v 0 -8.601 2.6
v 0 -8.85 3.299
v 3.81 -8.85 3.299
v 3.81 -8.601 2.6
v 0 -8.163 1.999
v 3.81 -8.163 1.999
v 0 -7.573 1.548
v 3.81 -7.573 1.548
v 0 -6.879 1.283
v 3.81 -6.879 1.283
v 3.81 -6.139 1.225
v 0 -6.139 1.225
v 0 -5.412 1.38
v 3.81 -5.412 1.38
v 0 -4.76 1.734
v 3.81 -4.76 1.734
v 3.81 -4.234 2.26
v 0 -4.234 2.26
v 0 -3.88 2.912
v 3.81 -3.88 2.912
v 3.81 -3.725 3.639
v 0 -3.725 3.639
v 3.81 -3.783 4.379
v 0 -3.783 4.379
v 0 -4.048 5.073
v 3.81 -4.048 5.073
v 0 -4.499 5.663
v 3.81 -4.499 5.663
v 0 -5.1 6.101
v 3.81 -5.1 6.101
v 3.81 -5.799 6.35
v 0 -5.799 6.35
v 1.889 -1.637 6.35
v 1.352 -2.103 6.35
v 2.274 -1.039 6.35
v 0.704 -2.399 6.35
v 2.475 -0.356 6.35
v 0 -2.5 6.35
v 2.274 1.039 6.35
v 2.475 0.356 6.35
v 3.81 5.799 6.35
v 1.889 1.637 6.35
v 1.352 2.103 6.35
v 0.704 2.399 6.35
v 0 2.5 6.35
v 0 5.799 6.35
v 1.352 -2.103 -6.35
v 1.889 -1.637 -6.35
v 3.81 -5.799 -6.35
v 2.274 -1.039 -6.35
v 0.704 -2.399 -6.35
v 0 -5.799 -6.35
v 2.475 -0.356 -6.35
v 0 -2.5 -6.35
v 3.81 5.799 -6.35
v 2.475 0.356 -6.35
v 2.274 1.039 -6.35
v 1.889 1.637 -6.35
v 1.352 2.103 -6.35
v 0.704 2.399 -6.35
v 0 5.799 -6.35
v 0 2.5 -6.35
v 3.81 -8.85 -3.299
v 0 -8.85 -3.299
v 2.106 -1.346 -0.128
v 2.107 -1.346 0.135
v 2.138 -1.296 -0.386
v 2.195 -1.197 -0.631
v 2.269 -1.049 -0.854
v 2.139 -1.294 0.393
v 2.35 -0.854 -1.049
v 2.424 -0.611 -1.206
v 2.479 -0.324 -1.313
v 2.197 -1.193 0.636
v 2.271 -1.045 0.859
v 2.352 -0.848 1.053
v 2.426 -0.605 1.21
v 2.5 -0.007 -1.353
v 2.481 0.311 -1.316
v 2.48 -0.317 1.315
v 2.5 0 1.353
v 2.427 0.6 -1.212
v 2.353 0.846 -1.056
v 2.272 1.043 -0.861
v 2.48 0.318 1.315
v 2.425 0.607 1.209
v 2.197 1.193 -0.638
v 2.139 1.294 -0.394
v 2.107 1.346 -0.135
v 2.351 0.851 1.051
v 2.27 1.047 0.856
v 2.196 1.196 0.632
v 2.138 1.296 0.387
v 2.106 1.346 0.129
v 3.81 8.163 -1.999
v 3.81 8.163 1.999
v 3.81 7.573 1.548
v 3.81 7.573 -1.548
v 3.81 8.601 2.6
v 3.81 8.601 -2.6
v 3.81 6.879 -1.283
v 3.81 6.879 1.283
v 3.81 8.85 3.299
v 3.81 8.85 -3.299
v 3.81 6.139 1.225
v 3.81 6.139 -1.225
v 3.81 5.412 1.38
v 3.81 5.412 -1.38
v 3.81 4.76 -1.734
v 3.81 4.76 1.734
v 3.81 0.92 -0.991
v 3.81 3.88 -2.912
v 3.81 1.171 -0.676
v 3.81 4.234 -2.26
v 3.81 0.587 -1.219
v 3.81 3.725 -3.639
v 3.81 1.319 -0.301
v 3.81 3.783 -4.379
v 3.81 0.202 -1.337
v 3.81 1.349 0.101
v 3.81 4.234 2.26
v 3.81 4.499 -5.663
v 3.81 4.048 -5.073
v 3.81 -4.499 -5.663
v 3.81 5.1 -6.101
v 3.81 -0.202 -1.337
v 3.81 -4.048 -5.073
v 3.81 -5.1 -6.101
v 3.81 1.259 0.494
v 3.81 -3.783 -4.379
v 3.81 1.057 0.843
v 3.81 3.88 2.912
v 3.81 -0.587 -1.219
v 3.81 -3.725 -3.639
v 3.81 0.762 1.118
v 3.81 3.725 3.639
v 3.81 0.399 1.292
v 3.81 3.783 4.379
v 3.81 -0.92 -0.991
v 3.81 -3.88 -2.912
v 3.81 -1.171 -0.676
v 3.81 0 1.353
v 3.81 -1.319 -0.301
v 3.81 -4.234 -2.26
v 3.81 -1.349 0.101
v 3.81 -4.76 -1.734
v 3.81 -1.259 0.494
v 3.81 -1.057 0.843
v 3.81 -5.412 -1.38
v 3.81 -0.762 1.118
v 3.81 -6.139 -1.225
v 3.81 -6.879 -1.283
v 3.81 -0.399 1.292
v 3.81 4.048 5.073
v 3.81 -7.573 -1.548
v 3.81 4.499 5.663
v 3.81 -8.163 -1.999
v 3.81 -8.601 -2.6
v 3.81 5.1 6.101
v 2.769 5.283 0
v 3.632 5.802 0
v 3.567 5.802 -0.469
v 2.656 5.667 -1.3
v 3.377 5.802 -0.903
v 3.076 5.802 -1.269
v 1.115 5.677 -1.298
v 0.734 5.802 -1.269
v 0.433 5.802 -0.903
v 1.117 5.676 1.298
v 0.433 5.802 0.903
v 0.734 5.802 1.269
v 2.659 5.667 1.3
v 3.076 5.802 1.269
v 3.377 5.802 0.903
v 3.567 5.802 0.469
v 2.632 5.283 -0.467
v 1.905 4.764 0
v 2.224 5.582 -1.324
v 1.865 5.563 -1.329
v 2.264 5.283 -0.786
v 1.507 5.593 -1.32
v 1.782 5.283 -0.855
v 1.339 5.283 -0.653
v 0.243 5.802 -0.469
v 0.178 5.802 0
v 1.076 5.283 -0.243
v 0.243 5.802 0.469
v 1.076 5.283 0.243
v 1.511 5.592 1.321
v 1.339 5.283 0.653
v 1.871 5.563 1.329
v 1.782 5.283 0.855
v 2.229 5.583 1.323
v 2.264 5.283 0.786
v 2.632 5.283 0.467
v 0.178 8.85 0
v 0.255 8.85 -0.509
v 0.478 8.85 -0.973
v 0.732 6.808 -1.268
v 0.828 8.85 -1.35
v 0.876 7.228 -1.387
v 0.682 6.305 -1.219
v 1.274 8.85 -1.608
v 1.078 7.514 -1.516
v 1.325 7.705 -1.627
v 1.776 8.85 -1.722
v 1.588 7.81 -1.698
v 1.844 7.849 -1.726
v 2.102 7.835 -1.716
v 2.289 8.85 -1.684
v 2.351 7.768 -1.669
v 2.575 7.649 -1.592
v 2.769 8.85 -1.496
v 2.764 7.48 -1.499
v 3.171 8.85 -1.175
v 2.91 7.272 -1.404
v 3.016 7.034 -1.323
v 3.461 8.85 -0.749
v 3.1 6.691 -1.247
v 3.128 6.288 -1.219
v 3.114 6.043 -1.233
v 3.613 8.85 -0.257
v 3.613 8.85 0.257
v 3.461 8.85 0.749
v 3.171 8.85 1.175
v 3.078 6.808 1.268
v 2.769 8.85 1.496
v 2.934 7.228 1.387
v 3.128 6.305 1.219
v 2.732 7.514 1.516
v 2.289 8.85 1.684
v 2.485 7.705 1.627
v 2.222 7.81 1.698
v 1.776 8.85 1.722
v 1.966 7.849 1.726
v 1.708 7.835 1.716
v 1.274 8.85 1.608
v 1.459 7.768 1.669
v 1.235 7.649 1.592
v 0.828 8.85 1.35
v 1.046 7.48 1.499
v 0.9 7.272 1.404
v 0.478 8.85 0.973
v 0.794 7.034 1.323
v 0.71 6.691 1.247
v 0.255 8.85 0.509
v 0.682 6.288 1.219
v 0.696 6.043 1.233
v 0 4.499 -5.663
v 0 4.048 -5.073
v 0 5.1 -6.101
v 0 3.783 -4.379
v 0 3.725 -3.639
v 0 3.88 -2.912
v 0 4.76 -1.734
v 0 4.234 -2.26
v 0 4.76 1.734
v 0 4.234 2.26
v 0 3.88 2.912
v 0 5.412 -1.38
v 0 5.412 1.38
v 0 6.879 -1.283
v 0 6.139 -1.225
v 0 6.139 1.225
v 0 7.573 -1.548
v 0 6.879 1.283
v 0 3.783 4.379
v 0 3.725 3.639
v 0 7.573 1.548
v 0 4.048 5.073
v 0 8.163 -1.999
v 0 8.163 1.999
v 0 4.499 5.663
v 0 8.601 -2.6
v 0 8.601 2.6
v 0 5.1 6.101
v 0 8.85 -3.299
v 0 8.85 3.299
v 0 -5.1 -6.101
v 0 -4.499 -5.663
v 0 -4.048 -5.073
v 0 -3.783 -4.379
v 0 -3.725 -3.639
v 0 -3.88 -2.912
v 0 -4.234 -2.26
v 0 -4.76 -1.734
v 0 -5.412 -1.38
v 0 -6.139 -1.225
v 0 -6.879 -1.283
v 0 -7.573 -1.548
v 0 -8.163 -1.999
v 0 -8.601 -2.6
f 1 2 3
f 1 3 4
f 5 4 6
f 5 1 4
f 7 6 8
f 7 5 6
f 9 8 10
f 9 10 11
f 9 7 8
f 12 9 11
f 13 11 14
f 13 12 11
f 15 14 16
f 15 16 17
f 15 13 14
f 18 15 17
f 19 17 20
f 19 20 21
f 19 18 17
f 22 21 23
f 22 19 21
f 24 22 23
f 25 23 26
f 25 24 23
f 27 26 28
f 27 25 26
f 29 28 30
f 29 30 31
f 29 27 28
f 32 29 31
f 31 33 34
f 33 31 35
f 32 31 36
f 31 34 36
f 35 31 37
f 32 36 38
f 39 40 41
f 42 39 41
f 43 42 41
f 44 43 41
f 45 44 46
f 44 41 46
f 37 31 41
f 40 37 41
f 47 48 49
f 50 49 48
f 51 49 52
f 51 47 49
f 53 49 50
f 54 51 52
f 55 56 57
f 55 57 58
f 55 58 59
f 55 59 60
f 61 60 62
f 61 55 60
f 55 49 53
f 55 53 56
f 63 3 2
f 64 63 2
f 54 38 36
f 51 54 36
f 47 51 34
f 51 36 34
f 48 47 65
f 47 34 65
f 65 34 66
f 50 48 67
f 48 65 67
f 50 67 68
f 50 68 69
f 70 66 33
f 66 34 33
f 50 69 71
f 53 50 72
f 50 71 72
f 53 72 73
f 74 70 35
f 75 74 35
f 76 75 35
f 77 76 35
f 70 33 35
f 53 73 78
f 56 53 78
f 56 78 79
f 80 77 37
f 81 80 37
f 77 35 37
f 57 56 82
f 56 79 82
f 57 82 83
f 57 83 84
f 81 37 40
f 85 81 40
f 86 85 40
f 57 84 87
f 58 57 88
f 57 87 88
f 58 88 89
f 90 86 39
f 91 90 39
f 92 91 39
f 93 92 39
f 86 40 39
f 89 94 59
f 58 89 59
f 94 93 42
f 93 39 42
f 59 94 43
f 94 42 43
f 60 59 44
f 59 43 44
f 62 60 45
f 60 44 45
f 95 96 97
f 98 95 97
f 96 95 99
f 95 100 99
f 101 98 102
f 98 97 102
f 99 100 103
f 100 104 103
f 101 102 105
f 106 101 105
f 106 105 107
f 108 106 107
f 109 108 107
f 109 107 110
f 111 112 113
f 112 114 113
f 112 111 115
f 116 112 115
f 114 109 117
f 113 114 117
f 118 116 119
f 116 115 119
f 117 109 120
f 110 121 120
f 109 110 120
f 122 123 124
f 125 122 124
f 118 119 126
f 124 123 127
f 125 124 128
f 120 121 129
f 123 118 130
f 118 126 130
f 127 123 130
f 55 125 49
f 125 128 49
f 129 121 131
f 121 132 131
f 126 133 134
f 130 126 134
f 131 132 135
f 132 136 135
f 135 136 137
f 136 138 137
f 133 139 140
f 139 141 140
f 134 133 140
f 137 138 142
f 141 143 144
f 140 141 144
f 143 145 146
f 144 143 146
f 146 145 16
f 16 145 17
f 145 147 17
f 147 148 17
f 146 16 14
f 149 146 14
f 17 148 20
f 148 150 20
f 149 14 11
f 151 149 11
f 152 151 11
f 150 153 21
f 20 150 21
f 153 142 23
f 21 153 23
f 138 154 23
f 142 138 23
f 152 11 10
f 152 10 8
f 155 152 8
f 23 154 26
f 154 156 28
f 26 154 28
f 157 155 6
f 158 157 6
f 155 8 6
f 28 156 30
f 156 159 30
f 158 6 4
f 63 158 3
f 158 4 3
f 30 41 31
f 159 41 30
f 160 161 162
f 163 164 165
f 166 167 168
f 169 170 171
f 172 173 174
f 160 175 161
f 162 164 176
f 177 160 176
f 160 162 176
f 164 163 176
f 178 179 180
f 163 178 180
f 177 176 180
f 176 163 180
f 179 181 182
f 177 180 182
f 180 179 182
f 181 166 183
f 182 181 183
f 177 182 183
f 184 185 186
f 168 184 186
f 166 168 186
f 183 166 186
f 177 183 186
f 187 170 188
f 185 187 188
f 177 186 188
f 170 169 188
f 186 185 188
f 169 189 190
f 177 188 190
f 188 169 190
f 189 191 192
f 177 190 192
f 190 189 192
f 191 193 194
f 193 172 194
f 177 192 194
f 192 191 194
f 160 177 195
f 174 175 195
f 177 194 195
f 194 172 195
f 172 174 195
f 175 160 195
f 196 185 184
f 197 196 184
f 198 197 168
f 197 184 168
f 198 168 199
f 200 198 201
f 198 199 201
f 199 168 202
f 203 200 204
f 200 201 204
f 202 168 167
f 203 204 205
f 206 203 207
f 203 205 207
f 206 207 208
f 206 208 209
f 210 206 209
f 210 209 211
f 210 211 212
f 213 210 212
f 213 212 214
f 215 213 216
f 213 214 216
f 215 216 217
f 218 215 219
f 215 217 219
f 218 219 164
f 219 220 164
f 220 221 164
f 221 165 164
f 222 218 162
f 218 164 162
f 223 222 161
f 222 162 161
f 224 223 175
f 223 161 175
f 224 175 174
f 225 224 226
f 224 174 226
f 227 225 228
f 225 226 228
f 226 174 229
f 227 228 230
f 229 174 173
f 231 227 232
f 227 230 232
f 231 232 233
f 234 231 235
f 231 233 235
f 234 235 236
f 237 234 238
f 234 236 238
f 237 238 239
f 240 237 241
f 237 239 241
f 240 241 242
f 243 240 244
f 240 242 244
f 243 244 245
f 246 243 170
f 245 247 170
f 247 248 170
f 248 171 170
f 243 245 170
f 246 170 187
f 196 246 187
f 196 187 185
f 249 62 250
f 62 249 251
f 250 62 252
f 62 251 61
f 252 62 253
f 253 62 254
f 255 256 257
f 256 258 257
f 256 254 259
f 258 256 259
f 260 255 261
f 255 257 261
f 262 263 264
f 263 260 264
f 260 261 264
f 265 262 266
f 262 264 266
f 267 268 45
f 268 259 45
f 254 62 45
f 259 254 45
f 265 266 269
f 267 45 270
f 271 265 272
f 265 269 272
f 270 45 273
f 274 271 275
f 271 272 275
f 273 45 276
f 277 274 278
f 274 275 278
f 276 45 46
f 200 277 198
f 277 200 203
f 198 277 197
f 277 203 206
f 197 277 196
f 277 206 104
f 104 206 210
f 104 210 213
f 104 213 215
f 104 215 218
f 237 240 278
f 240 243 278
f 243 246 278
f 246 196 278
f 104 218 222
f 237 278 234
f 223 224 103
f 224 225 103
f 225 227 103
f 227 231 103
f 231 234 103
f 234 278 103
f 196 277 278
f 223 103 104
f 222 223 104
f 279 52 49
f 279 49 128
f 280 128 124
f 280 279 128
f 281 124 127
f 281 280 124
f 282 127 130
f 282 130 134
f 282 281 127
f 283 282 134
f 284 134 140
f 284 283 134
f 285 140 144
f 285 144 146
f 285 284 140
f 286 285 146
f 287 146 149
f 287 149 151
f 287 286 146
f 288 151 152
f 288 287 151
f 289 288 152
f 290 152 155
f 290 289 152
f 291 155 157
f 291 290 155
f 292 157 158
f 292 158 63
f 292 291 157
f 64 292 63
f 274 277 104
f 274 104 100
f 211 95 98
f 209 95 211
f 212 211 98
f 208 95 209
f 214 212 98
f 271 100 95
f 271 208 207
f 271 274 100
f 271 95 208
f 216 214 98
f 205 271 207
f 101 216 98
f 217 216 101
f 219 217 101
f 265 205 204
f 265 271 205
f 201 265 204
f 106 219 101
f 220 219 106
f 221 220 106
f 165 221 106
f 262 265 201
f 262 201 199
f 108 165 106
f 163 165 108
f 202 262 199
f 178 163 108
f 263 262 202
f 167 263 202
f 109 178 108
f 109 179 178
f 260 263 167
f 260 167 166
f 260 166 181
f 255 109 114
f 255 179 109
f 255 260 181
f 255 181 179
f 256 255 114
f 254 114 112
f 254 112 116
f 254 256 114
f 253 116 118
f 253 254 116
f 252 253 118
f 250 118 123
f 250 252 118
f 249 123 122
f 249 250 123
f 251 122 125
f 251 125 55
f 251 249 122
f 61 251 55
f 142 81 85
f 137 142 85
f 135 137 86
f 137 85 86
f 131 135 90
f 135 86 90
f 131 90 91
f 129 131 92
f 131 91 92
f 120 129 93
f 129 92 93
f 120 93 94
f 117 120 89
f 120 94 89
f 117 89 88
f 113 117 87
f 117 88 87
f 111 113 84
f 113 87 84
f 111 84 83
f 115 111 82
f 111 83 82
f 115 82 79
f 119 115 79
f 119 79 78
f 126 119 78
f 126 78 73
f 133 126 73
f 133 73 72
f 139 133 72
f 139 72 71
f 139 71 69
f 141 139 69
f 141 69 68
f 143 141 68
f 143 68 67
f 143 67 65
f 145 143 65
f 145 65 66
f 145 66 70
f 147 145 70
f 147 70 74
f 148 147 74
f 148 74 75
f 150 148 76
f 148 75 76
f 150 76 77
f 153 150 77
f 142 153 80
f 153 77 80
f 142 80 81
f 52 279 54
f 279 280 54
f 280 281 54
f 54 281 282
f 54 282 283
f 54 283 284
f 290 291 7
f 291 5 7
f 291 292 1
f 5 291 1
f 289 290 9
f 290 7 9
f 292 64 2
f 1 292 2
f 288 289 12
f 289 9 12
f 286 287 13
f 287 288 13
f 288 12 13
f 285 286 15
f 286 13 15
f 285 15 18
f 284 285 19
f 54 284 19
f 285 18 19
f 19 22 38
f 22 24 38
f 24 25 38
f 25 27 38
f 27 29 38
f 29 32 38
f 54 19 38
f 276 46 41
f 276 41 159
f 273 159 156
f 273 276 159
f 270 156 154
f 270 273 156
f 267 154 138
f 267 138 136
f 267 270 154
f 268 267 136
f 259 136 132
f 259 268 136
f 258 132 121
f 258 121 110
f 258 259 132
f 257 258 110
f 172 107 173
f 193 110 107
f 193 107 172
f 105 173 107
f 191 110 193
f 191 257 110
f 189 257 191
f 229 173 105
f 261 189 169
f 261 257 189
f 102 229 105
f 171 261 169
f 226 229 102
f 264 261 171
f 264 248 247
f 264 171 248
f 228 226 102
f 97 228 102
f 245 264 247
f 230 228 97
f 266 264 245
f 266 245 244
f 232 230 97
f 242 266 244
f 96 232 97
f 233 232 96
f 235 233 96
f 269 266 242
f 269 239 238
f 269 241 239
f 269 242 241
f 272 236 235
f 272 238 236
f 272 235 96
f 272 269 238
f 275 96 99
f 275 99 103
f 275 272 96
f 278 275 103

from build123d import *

# Parameters (mm, degrees)
BOSS_EXTRUDE1_DEPTH            = 6.35
F_8_32_TAPPED_HOLE1_D          = 3.4544
F_8_32_TAPPED_HOLE1_DEPTH      = 3.048
F_8_32_TAPPED_HOLE1_TIP        = 1.037806461
F_6_32_TAPPED_HOLE1_D          = 2.7051
F_6_32_TAPPED_HOLE1_DEPTH      = 9.398
F_6_32_TAPPED_HOLE1_TIP        = 0.81269403
F_6_0_204_DIAMETER_HOLE1_DEPTH = 3.81


# Read off the part's stored shape, not the designer's step: #6 (0.204) Diameter Hole1
with BuildPart() as part:
    # Sketch1 → Boss-Extrude1 (new, symmetric)
    with BuildSketch(Plane.XY):
        with BuildLine():
            ThreePointArc((0, -2.499995), (2.499995, 0), (0, 2.499995))
            Line((0, 2.499995), (0, 8.849995))
            Line((0, 8.849995), (3.81, 8.849995))
            Line((3.81, 8.849995), (3.81, -8.849995))
            Line((3.81, -8.849995), (0, -8.849995))
            Line((0, -8.849995), (0, -2.499995))
        make_face()
    extrude(amount=BOSS_EXTRUDE1_DEPTH, both=True)

    # #8-32 Tapped Hole1
    with Locations(Plane(origin=(0, 8.849995, 0), x_dir=(1, 0, 0), z_dir=(0, 1, 0))):
        with Locations((1.905, 0)):
            Hole(F_8_32_TAPPED_HOLE1_D / 2, depth=F_8_32_TAPPED_HOLE1_DEPTH)
            with Locations((0, 0, -(F_8_32_TAPPED_HOLE1_DEPTH + F_8_32_TAPPED_HOLE1_TIP / 2))):  # 118° drill point
                Cone(0, F_8_32_TAPPED_HOLE1_D / 2, F_8_32_TAPPED_HOLE1_TIP, mode=Mode.SUBTRACT)

    # #6-32 Tapped Hole1
    with Locations(Plane(origin=(3.81, 0, 0), x_dir=(0, 0, -1), z_dir=(1, 0, 0))):
        with Locations((0, 0)):
            Hole(F_6_32_TAPPED_HOLE1_D / 2, depth=F_6_32_TAPPED_HOLE1_DEPTH)
            with Locations((0, 0, -(F_6_32_TAPPED_HOLE1_DEPTH + F_6_32_TAPPED_HOLE1_TIP / 2))):  # 118° drill point
                Cone(0, F_6_32_TAPPED_HOLE1_D / 2, F_6_32_TAPPED_HOLE1_TIP, mode=Mode.SUBTRACT)

    # #6 (0.204) Diameter Hole1 outline → #6 (0.204) Diameter Hole1 (cut)
    with BuildSketch(Plane.YZ):
        with BuildLine():
            Line((-8.849995, 6.35), (-8.849995, 3.299466318))
            ThreePointArc((-8.849995, 3.299466318), (-4.478022751, 1.978027751), (-5.799461318, 6.35))
            Line((-5.799461318, 6.35), (-8.849995, 6.35))
        make_face()
        with BuildLine():
            ThreePointArc((-5.799461318, -6.35), (-4.478022751, -1.978027751), (-8.849995, -3.299466318))
            Line((-8.849995, -3.299466318), (-8.849995, -6.35))
            Line((-8.849995, -6.35), (-5.799461318, -6.35))
        make_face()
        with BuildLine():
            Line((8.849995, 6.35), (5.799461318, 6.35))
            ThreePointArc((5.799461318, 6.35), (4.478022751, 1.978027751), (8.849995, 3.299466318))
            Line((8.849995, 3.299466318), (8.849995, 6.35))
        make_face()
        with BuildLine():
            ThreePointArc((8.849995, -3.299466318), (4.478022751, -1.978027751), (5.799461318, -6.35))
            Line((5.799461318, -6.35), (8.849995, -6.35))
            Line((8.849995, -6.35), (8.849995, -3.299466318))
        make_face()
    extrude(amount=F_6_0_204_DIAMETER_HOLE1_DEPTH, mode=Mode.SUBTRACT)


solid = part.part
